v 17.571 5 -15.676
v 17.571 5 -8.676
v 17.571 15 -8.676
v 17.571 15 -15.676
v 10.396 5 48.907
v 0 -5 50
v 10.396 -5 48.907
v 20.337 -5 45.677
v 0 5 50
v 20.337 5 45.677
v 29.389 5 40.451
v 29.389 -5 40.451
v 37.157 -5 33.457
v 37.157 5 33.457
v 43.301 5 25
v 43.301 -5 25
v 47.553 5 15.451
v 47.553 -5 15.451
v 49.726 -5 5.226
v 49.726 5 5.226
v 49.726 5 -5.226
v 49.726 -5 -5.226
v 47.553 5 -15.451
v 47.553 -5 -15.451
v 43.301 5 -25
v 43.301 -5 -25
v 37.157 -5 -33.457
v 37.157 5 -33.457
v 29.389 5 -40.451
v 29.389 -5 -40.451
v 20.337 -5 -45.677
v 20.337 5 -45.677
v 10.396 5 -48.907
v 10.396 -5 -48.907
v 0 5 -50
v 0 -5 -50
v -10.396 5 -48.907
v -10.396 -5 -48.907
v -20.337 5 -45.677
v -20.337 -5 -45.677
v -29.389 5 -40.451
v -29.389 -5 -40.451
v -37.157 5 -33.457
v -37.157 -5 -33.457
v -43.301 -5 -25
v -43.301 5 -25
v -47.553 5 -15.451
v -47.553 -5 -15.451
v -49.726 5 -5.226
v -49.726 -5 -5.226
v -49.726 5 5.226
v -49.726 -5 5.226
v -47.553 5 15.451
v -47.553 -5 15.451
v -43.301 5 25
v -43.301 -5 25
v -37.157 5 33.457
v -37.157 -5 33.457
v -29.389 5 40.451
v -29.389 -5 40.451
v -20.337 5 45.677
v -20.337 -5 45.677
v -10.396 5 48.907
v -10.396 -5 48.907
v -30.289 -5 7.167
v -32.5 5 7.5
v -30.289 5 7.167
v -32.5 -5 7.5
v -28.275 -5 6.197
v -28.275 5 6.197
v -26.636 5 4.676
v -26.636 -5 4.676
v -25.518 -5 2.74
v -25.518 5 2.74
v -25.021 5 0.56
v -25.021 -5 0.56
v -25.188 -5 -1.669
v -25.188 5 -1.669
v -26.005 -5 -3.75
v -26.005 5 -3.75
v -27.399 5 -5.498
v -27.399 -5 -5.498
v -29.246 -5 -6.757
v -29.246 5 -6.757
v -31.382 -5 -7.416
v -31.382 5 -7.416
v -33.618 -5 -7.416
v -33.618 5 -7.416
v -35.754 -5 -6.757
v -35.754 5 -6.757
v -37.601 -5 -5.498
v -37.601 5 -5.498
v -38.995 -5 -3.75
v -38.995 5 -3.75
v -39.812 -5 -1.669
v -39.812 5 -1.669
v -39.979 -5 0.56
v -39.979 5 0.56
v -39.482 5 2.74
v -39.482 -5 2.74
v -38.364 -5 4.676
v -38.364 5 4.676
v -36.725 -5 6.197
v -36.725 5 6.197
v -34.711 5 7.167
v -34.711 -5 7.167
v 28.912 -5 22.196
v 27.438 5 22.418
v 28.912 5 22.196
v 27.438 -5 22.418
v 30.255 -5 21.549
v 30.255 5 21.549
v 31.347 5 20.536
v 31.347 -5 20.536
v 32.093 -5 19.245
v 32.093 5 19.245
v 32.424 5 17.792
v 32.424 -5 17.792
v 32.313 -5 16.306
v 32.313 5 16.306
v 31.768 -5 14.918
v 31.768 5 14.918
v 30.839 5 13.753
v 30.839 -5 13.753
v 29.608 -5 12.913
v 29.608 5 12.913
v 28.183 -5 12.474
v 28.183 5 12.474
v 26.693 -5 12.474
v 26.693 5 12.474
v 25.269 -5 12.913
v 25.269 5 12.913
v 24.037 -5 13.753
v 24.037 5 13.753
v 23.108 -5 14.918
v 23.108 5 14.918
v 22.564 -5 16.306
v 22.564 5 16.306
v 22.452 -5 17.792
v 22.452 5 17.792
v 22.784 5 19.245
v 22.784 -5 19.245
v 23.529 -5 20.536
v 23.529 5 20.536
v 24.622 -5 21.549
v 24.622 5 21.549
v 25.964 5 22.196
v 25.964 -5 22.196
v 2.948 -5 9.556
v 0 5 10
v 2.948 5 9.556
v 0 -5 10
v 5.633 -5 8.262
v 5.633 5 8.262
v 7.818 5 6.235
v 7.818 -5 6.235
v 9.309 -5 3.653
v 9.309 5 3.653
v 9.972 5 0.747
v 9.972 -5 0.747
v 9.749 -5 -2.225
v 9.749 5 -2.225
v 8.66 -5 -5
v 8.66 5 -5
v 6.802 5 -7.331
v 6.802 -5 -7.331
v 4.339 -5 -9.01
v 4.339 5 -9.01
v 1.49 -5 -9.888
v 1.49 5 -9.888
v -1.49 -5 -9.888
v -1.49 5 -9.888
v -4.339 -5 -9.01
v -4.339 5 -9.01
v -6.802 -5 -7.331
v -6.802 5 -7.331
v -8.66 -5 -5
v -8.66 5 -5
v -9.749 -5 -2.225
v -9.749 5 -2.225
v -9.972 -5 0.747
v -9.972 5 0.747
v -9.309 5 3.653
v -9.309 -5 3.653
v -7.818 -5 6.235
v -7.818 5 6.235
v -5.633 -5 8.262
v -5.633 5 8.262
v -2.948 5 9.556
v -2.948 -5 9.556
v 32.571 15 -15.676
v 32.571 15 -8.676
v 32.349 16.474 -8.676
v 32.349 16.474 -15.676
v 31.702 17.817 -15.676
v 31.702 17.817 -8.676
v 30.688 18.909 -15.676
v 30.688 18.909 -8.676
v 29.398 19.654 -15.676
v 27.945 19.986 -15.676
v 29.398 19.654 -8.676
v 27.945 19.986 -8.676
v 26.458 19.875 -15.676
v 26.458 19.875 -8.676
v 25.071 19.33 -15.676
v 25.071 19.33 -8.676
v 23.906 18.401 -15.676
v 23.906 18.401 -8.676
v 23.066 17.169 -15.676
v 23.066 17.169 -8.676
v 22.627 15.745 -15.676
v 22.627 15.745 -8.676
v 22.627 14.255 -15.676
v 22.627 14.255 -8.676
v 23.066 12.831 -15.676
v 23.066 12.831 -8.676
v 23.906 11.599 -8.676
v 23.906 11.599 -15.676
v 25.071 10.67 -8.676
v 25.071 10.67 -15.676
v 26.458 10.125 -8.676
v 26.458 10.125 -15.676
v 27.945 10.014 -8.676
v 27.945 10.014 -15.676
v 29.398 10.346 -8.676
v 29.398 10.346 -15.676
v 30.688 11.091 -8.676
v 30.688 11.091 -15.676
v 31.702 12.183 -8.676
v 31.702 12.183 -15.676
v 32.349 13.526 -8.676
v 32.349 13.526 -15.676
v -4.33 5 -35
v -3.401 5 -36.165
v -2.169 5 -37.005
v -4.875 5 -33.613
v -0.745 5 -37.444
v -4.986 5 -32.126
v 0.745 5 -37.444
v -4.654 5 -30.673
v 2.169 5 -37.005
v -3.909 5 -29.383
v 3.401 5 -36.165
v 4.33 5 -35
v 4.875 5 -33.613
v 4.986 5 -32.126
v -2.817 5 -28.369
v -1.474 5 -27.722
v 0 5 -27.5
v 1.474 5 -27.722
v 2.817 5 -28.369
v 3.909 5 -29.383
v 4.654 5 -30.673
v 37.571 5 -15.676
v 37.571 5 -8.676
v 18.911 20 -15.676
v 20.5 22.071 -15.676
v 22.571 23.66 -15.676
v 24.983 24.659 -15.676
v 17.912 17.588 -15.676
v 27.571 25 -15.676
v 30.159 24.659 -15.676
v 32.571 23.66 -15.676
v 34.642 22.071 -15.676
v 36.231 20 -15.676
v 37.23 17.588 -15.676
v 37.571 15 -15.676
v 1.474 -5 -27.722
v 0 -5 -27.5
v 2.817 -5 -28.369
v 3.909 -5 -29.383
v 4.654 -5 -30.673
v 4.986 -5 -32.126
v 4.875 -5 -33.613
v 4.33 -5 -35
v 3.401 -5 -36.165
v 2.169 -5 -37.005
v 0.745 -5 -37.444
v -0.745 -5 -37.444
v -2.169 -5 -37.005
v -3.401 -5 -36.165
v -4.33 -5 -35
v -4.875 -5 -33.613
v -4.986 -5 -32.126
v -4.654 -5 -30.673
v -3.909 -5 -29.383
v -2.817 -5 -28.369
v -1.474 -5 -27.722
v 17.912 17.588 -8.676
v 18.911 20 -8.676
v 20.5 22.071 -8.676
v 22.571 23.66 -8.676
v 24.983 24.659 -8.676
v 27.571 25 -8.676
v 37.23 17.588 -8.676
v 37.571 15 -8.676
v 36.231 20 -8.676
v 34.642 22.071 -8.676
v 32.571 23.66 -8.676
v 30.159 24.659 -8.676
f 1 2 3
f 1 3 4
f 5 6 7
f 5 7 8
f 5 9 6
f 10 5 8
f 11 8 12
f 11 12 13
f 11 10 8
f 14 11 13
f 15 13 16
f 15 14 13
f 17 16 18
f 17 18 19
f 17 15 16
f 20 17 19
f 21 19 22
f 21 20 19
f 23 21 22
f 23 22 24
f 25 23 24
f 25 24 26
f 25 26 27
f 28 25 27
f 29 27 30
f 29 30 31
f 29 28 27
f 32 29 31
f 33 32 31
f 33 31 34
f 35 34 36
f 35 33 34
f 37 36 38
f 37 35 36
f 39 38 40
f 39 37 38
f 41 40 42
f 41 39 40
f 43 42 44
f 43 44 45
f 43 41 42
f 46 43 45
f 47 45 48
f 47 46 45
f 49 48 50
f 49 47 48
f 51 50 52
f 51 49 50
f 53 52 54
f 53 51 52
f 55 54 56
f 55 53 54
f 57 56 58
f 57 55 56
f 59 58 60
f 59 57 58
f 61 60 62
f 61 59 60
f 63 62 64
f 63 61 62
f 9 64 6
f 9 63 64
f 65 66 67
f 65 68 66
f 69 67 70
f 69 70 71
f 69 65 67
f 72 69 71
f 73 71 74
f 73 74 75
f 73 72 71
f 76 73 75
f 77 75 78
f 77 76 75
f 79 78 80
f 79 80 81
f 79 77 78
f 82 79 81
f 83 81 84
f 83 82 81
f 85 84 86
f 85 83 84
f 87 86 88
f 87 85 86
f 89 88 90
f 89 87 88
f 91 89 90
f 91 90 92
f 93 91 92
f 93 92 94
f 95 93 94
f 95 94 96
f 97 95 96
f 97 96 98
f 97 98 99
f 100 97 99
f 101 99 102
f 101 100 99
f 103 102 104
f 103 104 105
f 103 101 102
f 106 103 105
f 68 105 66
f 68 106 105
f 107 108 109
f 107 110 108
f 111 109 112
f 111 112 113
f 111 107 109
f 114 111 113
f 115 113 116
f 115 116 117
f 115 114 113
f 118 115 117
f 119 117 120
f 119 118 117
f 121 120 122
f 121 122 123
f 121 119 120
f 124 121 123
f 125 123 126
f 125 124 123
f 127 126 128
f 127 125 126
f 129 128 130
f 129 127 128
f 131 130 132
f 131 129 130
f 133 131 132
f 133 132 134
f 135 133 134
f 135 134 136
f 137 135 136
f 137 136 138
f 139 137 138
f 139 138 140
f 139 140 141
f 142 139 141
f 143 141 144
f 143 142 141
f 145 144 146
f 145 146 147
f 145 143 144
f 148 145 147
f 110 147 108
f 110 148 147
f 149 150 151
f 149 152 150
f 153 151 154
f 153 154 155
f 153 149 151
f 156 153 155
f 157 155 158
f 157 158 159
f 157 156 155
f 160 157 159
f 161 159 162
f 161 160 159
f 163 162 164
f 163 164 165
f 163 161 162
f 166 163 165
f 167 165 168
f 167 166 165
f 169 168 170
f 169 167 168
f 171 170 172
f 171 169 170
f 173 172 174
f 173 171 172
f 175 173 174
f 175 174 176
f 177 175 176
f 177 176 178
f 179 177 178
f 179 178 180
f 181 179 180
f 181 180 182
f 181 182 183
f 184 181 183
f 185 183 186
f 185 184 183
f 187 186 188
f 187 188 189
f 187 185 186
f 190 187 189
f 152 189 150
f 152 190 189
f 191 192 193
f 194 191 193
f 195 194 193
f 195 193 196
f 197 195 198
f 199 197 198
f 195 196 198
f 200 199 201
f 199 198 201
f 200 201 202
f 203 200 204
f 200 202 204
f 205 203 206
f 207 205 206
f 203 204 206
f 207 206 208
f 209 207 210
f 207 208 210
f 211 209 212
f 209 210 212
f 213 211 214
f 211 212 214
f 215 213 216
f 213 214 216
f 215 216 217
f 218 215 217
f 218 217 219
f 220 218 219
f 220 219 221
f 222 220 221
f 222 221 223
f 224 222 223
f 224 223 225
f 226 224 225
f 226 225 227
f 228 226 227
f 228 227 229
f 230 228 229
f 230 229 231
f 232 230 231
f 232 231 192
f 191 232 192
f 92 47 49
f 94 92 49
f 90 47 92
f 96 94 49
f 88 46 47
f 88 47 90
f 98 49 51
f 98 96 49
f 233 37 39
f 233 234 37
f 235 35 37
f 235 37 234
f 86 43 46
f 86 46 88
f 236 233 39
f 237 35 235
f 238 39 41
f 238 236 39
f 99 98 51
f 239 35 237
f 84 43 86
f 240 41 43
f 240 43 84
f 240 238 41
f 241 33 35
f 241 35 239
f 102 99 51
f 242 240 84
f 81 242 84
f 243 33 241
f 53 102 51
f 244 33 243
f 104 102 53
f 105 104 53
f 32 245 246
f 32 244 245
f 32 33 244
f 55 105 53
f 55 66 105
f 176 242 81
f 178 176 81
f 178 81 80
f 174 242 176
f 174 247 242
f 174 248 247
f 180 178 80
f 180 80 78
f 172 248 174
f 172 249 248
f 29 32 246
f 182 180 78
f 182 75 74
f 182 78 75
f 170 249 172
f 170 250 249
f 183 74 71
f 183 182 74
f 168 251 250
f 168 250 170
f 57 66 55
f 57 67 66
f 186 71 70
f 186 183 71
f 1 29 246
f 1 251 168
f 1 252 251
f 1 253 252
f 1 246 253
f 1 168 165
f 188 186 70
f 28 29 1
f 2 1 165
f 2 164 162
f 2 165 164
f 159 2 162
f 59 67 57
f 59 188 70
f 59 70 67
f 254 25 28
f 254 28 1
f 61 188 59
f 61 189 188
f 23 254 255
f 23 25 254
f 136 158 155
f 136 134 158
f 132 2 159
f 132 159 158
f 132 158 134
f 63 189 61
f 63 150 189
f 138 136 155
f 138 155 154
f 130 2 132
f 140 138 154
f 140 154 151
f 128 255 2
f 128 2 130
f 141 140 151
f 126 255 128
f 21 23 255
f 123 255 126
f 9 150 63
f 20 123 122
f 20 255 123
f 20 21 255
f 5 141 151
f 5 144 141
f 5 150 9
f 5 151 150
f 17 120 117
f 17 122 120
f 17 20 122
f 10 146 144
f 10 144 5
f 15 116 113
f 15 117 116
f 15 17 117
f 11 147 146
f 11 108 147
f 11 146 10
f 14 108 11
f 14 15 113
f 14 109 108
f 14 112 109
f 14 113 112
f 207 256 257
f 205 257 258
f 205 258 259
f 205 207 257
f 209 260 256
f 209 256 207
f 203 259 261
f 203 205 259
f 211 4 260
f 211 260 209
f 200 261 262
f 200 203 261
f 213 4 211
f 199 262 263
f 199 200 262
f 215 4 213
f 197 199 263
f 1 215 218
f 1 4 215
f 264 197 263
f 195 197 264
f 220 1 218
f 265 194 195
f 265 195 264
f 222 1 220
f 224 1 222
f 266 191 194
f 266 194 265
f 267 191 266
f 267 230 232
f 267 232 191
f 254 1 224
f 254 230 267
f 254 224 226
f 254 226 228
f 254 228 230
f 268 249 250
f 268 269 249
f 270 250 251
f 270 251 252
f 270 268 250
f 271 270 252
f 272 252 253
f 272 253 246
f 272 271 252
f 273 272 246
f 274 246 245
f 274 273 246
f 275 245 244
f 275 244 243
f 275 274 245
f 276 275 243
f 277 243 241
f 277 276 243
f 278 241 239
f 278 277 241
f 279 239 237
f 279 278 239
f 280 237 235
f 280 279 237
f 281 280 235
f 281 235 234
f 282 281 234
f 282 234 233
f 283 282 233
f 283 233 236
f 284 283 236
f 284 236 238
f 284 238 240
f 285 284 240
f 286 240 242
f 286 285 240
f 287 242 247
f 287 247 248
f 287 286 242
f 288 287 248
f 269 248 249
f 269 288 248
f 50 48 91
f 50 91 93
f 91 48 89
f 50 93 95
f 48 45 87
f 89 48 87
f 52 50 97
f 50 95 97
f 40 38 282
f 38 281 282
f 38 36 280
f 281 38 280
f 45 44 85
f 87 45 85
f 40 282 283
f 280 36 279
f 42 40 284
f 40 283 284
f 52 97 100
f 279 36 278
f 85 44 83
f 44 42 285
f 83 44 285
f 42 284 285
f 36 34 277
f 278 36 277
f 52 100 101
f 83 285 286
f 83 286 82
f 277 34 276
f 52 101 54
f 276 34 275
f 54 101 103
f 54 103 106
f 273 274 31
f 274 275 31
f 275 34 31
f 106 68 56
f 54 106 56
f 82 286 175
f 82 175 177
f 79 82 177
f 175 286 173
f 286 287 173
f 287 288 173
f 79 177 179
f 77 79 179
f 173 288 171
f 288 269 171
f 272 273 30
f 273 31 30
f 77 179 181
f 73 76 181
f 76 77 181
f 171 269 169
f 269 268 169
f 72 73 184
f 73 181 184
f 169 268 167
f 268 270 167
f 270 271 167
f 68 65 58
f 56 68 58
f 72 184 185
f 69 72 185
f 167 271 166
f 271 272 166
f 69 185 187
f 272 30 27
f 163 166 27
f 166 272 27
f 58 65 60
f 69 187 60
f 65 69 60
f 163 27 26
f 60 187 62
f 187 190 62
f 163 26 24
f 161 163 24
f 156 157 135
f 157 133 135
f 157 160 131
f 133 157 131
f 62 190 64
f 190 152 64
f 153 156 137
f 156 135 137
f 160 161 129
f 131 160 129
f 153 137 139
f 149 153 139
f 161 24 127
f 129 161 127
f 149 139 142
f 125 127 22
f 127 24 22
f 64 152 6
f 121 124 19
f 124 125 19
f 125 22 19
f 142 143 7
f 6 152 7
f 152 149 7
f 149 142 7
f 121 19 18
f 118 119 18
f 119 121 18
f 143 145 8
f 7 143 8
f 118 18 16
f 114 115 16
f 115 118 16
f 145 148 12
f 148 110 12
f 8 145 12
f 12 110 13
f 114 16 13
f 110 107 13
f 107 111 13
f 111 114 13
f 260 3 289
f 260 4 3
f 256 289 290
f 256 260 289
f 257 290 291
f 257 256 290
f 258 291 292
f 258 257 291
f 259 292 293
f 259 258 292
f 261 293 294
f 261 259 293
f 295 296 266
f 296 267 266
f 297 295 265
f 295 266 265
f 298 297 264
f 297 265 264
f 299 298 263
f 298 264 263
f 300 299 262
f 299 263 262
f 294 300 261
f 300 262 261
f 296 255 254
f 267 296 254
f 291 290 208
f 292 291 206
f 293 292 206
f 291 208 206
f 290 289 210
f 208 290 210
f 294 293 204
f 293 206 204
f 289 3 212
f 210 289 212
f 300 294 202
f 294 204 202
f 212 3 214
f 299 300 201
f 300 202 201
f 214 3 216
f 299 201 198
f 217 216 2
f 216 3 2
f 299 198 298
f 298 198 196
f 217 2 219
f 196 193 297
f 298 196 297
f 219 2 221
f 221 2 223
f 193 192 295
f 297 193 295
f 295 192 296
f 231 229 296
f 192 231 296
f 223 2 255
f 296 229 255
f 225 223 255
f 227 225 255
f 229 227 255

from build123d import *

# Parameters (mm, degrees)
SKETCH1_R           = 50
SKETCH1_R_2         = 5
SKETCH1_R_3         = 7.5
SKETCH1_R_4         = 10
BOSS_EXTRUDE1_DEPTH = 5
SKETCH2_W           = 20
SKETCH2_H           = 7
BOSS_EXTRUDE2_DEPTH = 20
FILLET1_R           = 10
SKETCH3_R           = 5
CUT_EXTRUDE1_DEPTH  = 82.04221019


with BuildPart() as part:
    # Sketch1 → Boss-Extrude1 (new, symmetric)
    with BuildSketch(Plane(origin=(0, 0, 0), x_dir=(1, 0, 0), z_dir=(0, 1, 0))):
        with Locations(Location((0, 0, 0), (0, 0, 270))):
            Circle(SKETCH1_R)
        with Locations(Location((27.43826166, -17.418145627, 0), (0, 0, 270))):
            Circle(SKETCH1_R_2, mode=Mode.SUBTRACT)
        with Locations(Location((-32.5, 0, 0), (0, 0, 270))):
            Circle(SKETCH1_R_3, mode=Mode.SUBTRACT)
        with Locations(Location((0, 32.5, 0), (0, 0, 270))):
            Circle(SKETCH1_R_2, mode=Mode.SUBTRACT)
        with Locations(Location((0, 0, 0), (0, 0, 270))):
            Circle(SKETCH1_R_4, mode=Mode.SUBTRACT)
    extrude(amount=BOSS_EXTRUDE1_DEPTH, both=True)

    # Sketch2 → Boss-Extrude2 (add)
    with BuildSketch(Plane(origin=(0, 5, 0), x_dir=(1, 0, 0), z_dir=(0, 1, 0))):
        with Locations((27.570975848, 12.175717572)):
            Rectangle(SKETCH2_W, SKETCH2_H)
    extrude(amount=BOSS_EXTRUDE2_DEPTH)

    # Fillet1
    fillet1_edges = [part.edges().sort_by_distance(p)[0] for p in [
        (17.570975848, 25, -12.175717572),
        (37.570975848, 25, -12.175717572),
    ]]
    fillet(fillet1_edges, radius=FILLET1_R - 0.0001)  # a hair under: the kernel refuses the full size

    # Sketch3 → Cut-Extrude1 (cut, through all)
    with BuildSketch(Plane.XY.offset(-8.675717572)):
        with Locations((27.570975848, 15)):
            Circle(SKETCH3_R)
    extrude(amount=-CUT_EXTRUDE1_DEPTH, mode=Mode.SUBTRACT)


solid = part.part
